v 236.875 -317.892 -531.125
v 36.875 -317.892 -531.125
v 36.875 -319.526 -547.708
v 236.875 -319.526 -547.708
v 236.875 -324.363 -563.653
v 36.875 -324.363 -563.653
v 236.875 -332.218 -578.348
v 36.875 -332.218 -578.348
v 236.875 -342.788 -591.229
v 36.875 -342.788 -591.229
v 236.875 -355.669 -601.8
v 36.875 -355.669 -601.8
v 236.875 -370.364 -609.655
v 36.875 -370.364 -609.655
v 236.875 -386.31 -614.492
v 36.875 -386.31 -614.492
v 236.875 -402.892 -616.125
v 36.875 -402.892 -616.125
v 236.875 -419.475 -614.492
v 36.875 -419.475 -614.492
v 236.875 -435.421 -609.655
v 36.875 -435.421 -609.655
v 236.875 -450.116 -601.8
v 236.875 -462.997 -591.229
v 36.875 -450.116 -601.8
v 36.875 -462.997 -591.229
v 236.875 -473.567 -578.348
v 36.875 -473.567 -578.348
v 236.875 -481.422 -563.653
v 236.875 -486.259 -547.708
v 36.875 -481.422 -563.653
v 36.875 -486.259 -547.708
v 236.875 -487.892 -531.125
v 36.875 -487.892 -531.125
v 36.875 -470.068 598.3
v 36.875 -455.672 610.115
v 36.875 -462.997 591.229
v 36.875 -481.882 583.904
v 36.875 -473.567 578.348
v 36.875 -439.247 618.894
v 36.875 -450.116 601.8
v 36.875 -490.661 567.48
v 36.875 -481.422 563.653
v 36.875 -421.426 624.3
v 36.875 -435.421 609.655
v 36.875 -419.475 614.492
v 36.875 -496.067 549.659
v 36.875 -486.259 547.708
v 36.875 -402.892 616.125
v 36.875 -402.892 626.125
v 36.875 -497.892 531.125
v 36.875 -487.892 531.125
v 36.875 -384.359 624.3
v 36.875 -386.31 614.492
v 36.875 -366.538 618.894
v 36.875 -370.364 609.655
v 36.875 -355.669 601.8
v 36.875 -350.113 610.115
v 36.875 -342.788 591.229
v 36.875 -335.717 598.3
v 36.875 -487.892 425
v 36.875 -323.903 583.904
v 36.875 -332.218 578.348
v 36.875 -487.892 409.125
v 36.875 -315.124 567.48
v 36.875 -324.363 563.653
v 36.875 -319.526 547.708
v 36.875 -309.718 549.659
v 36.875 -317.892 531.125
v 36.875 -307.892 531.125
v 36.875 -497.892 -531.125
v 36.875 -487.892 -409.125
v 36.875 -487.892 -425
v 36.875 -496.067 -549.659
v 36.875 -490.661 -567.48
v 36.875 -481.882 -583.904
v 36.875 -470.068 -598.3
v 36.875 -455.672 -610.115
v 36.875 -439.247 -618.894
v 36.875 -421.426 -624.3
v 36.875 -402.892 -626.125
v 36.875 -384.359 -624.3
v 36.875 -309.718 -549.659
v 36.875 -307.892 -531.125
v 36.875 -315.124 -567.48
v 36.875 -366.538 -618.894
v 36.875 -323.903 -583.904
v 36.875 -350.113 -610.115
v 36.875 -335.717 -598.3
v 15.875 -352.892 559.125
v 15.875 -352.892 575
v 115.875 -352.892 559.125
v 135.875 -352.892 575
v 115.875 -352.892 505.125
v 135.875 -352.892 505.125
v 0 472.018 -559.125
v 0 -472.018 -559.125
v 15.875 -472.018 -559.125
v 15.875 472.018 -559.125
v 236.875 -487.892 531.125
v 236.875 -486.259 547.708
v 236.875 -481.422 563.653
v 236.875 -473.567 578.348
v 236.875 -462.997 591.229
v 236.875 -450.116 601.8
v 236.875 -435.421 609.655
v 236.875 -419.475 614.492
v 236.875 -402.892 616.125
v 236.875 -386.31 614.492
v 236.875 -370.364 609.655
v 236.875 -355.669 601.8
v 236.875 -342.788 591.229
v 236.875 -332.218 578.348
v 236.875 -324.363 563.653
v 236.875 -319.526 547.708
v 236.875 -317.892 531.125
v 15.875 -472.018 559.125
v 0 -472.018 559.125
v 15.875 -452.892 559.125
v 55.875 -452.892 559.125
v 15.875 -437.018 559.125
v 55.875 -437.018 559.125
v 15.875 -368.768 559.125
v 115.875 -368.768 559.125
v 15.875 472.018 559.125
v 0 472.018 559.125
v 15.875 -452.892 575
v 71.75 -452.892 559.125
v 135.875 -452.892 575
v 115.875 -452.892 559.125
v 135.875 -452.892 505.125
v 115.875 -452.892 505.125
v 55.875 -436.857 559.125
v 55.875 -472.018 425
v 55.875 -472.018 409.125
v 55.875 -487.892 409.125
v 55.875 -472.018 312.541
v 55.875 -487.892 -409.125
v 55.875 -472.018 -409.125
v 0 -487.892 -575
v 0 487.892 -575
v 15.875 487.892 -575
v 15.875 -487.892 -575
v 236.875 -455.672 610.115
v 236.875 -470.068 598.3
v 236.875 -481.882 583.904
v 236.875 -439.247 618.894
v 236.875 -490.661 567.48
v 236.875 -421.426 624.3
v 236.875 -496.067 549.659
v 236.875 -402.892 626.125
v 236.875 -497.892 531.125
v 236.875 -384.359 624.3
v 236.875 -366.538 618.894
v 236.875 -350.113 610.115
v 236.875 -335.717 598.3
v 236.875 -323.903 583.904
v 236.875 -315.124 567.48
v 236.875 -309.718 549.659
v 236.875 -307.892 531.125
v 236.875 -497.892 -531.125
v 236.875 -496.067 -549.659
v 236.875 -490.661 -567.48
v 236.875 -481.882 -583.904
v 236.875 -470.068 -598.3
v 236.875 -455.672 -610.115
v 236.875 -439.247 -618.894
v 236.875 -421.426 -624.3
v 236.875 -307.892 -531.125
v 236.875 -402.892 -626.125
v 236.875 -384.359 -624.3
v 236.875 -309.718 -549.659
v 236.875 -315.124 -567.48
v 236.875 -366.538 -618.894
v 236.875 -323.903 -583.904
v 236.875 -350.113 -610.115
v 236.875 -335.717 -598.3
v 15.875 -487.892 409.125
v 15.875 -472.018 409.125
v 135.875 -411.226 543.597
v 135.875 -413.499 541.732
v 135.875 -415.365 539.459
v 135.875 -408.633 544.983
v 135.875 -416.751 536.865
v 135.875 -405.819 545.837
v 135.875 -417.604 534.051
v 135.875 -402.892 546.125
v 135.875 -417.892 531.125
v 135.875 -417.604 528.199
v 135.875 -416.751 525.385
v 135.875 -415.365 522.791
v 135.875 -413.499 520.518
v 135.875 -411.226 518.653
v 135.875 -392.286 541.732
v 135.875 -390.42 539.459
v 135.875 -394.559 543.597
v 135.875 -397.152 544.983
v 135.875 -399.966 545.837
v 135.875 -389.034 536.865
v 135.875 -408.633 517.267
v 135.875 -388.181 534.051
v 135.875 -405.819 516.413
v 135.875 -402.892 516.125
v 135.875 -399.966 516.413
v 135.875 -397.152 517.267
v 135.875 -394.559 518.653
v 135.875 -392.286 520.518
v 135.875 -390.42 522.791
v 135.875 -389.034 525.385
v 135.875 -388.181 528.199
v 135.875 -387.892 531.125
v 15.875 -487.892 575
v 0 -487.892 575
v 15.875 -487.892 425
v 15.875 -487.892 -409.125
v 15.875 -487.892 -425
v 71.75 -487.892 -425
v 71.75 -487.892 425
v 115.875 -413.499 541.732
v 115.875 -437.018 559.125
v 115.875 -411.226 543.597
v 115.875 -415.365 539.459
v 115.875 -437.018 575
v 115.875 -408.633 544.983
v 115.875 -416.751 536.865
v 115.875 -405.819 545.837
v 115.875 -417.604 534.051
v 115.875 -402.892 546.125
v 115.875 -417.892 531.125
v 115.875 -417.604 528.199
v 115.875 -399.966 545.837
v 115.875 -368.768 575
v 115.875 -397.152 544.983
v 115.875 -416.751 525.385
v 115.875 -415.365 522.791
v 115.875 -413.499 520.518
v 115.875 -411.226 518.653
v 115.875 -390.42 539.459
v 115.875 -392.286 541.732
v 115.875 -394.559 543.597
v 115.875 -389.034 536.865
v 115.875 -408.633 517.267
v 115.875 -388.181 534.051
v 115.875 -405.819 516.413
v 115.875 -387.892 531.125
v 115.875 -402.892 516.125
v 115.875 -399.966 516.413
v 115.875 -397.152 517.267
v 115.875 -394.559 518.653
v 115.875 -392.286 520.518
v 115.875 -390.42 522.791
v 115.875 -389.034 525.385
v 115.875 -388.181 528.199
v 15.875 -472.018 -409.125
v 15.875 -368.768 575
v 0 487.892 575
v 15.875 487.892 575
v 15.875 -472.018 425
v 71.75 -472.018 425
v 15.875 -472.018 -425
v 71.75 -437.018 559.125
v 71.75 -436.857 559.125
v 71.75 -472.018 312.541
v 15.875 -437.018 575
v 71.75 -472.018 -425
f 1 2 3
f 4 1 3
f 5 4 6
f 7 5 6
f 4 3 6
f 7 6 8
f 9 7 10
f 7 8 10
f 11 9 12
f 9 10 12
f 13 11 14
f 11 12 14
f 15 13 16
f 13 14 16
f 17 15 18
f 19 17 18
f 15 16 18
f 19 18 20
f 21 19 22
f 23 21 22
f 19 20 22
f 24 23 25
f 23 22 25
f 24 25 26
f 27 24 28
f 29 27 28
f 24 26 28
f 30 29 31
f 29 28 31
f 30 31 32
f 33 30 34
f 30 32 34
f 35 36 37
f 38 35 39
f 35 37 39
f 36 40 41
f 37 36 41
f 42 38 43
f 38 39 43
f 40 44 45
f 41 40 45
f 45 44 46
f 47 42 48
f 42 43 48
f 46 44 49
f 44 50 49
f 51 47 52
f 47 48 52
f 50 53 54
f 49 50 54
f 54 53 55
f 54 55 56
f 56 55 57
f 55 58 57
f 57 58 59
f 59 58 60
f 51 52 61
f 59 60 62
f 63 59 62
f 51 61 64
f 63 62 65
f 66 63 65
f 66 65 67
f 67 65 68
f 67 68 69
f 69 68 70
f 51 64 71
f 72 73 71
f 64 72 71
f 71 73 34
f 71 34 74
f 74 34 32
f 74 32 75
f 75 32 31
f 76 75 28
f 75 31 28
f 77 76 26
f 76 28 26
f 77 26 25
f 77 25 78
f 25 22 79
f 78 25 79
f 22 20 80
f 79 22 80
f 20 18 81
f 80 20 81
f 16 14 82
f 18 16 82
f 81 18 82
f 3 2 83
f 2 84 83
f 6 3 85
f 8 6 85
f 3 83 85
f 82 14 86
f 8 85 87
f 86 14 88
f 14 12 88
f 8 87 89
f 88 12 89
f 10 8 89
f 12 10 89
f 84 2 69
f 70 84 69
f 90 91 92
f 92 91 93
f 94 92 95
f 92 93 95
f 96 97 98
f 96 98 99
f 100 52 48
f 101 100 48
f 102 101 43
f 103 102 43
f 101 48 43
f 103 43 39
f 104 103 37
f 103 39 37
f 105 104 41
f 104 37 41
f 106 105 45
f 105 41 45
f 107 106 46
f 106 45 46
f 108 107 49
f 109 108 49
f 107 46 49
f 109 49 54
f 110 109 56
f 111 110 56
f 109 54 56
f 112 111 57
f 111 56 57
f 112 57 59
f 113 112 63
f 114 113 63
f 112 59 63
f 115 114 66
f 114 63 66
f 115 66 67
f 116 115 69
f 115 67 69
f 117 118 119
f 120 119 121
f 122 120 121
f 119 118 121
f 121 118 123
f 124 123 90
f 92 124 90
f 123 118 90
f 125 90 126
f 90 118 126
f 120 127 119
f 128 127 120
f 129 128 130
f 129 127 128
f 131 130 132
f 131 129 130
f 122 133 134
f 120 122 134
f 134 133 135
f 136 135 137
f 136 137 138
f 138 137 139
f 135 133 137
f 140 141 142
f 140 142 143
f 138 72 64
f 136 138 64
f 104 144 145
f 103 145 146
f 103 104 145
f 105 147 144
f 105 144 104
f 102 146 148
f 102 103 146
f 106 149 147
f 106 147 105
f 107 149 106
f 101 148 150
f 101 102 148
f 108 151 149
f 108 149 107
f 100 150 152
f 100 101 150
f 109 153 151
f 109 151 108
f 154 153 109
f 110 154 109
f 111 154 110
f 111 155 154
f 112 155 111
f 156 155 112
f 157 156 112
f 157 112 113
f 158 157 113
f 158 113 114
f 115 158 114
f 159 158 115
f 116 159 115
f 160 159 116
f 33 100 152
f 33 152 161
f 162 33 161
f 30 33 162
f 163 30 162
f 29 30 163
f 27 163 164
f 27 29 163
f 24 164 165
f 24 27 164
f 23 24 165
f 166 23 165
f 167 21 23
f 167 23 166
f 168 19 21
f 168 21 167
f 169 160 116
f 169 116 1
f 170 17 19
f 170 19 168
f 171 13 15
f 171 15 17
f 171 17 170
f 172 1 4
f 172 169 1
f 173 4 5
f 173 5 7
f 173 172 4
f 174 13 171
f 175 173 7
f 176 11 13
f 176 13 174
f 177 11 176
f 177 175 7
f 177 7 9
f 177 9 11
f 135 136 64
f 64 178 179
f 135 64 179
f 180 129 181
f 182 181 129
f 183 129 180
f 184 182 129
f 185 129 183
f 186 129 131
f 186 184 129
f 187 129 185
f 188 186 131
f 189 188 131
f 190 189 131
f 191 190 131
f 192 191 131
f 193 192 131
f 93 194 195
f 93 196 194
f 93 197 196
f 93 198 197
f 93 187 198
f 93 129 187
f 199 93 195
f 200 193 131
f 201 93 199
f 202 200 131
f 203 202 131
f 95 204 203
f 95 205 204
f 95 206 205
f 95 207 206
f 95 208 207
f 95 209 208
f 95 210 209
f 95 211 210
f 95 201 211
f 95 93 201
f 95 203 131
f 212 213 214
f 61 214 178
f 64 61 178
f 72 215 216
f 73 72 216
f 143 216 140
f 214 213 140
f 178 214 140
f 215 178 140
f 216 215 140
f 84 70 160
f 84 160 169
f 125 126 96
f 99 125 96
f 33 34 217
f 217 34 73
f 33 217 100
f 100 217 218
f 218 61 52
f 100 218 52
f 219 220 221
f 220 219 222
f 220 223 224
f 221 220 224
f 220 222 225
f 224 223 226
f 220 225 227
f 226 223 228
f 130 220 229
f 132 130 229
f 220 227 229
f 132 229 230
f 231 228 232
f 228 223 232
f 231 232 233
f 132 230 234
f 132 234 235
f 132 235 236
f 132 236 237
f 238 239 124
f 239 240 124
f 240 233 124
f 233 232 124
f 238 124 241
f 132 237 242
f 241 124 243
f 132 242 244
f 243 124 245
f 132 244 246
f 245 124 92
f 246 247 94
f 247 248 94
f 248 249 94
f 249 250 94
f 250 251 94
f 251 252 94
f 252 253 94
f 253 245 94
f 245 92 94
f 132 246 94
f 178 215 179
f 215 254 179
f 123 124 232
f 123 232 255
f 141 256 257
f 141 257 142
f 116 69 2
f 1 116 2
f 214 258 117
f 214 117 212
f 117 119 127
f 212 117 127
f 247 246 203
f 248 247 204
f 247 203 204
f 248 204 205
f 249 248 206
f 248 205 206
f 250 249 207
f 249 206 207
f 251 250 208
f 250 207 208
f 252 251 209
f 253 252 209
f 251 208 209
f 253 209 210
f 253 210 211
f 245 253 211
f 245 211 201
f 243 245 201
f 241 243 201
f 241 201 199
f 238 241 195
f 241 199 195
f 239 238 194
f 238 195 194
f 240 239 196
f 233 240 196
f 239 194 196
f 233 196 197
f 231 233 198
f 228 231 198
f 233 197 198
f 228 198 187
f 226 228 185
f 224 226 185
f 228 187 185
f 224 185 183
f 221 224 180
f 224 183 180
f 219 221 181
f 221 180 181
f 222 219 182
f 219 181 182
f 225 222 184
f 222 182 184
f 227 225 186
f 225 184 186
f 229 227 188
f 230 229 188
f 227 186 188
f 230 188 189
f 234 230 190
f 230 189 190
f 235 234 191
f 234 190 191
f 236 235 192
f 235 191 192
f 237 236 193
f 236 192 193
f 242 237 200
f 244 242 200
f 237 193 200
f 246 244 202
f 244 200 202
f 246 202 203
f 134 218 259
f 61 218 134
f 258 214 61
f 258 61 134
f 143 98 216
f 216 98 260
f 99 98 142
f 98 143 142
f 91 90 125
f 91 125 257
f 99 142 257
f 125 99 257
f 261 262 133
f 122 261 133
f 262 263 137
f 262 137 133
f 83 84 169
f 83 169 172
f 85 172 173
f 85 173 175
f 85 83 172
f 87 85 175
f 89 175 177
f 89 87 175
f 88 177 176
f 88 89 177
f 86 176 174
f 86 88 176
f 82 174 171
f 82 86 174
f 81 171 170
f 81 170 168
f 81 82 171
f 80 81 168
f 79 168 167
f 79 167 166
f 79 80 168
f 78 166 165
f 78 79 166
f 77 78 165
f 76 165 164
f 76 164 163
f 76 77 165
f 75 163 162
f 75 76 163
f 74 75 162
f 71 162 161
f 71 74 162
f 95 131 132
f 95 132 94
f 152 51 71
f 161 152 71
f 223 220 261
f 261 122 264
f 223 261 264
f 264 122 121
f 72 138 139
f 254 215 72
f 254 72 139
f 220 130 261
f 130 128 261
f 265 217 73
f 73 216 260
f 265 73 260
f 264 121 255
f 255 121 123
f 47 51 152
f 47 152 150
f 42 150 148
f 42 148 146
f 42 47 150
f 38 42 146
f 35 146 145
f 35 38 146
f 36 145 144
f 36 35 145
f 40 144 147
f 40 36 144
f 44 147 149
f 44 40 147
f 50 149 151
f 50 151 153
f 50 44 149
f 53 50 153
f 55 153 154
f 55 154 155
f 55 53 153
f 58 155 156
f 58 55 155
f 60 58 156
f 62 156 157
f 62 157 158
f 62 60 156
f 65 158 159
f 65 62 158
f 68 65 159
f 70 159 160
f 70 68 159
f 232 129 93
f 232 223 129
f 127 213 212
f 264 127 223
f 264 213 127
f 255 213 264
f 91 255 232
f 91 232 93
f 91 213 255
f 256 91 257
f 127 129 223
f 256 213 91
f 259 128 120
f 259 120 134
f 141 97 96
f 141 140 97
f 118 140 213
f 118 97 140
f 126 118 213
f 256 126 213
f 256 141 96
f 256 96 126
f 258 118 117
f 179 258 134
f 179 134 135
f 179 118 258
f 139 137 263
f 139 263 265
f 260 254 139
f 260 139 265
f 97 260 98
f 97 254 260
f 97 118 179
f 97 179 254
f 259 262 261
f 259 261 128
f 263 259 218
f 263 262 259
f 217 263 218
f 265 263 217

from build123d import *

# Parameters (mm, degrees)
SKETCH1_W           = 1118.25
SKETCH1_H           = 944.035
BOSS_EXTRUDE1_DEPTH = 15.875
SKETCH2_W           = 15.875
SKETCH2_H           = 15.875
BOSS_EXTRUDE2_DEPTH = 55.785
SKETCH3_W           = 15.875
SKETCH3_H           = 15.875
BOSS_EXTRUDE3_DEPTH = 850
EXTRUDE_THIN2_START = 21
SKETCH4_W           = 850
SKETCH4_H           = 10
EXTRUDE_THIN2_DEPTH = 200
SKETCH5_W           = 15.875
SKETCH5_H           = 100
BOSS_EXTRUDE4_DEPTH = 120
SKETCH7_W           = 54
SKETCH7_H           = 100
SKETCH7_R           = 15
BOSS_EXTRUDE5_DEPTH = 20
BOSS_EXTRUDE6_DEPTH = 15.875
SKETCH11_W          = 100
SKETCH11_H          = 68.25
CUT_EXTRUDE1_DEPTH  = 20


with BuildPart() as part:
    # Sketch1 → Boss-Extrude1 (new body)
    with BuildSketch(Plane(origin=(0, 0, 0), x_dir=(0, 0, -1), z_dir=(1, 0, 0))):
        Polygon((-575, -487.8925), (-575, 487.8925), (575, 487.8925), (575, -487.8925), (559.125, -487.8925), (-559.125, -487.8925), align=None)
        Rectangle(SKETCH1_W, SKETCH1_H, mode=Mode.SUBTRACT)
    extrude(amount=BOSS_EXTRUDE1_DEPTH)

    # Sketch2 → Boss-Extrude2 (add)
    with BuildSketch(Plane(origin=(15.875, 0, 0), x_dir=(0, 0, -1), z_dir=(1, 0, 0))):
        with Locations((-417.0625, -479.955)):
            Rectangle(SKETCH2_W, SKETCH2_H)
        with Locations((417.0625, -479.955)):
            Rectangle(SKETCH2_W, SKETCH2_H)
    extrude(amount=BOSS_EXTRUDE2_DEPTH)

    # Sketch3 → Boss-Extrude3 (add)
    with BuildSketch(Plane.XY.offset(425)):
        with Locations((63.8125, -479.955)):
            Rectangle(SKETCH3_W, SKETCH3_H)
    extrude(amount=-BOSS_EXTRUDE3_DEPTH)

    # Sketch4 → Extrude-Thin2 (add)
    with BuildSketch(Plane(origin=(15.875, 0, 0), x_dir=(0, 0, -1), z_dir=(1, 0, 0)).offset(EXTRUDE_THIN2_START)):
        with Locations((0, -492.8925)):
            Rectangle(SKETCH4_W, SKETCH4_H)
        with BuildLine():
            Line((531.125, -497.8925), (-531.125, -497.8925))
            ThreePointArc((-531.125, -497.8925), (-626.125, -402.8925), (-531.125, -307.8925))
            Line((-531.125, -307.8925), (531.125, -307.8925))
            ThreePointArc((531.125, -307.8925), (626.125, -402.8925), (531.125, -497.8925))
        make_face()
        with BuildLine():
            Line((531.125, -487.8925), (-531.125, -487.8925))
            ThreePointArc((-531.125, -487.8925), (-616.125, -402.8925), (-531.125, -317.8925))
            Line((-531.125, -317.8925), (531.125, -317.8925))
            ThreePointArc((531.125, -317.8925), (616.125, -402.8925), (531.125, -487.8925))
        make_face(mode=Mode.SUBTRACT)
    extrude(amount=EXTRUDE_THIN2_DEPTH)

    # Sketch5 → Boss-Extrude4 (add)
    with BuildSketch(Plane(origin=(15.875, 0, 0), x_dir=(0, 0, -1), z_dir=(1, 0, 0))):
        with Locations((-567.0625, -402.8925)):
            Rectangle(SKETCH5_W, SKETCH5_H)
    extrude(amount=BOSS_EXTRUDE4_DEPTH)

    # Sketch7 → Boss-Extrude5 (add)
    with BuildSketch(Plane(origin=(135.875, 0, 0), x_dir=(0, 0, -1), z_dir=(1, 0, 0))):
        with Locations((-532.125, -402.8925)):
            Rectangle(SKETCH7_W, SKETCH7_H)
        with Locations((-531.125, -402.8925)):
            Circle(SKETCH7_R, mode=Mode.SUBTRACT)
    extrude(amount=-BOSS_EXTRUDE5_DEPTH)

    # Sketch9 → Boss-Extrude6 (add)
    with BuildSketch(Plane(origin=(71.75, 0, 0), x_dir=(0, 0, -1), z_dir=(1, 0, 0))):
        Polygon((-425, -472.0175), (-312.541363962, -472.0175), (-559.125, -436.856925616), (-559.125, -452.8925), align=None)
    extrude(amount=-BOSS_EXTRUDE6_DEPTH)

    # Sketch11 → Cut-Extrude1 (cut)
    with BuildSketch(Plane(origin=(0, 0, 559.125), x_dir=(-1, 0, 0), z_dir=(0, 0, -1))):
        with Locations((-65.875, -402.8925)):
            Rectangle(SKETCH11_W, SKETCH11_H)
    extrude(amount=-CUT_EXTRUDE1_DEPTH, mode=Mode.SUBTRACT)


solid = part.part
